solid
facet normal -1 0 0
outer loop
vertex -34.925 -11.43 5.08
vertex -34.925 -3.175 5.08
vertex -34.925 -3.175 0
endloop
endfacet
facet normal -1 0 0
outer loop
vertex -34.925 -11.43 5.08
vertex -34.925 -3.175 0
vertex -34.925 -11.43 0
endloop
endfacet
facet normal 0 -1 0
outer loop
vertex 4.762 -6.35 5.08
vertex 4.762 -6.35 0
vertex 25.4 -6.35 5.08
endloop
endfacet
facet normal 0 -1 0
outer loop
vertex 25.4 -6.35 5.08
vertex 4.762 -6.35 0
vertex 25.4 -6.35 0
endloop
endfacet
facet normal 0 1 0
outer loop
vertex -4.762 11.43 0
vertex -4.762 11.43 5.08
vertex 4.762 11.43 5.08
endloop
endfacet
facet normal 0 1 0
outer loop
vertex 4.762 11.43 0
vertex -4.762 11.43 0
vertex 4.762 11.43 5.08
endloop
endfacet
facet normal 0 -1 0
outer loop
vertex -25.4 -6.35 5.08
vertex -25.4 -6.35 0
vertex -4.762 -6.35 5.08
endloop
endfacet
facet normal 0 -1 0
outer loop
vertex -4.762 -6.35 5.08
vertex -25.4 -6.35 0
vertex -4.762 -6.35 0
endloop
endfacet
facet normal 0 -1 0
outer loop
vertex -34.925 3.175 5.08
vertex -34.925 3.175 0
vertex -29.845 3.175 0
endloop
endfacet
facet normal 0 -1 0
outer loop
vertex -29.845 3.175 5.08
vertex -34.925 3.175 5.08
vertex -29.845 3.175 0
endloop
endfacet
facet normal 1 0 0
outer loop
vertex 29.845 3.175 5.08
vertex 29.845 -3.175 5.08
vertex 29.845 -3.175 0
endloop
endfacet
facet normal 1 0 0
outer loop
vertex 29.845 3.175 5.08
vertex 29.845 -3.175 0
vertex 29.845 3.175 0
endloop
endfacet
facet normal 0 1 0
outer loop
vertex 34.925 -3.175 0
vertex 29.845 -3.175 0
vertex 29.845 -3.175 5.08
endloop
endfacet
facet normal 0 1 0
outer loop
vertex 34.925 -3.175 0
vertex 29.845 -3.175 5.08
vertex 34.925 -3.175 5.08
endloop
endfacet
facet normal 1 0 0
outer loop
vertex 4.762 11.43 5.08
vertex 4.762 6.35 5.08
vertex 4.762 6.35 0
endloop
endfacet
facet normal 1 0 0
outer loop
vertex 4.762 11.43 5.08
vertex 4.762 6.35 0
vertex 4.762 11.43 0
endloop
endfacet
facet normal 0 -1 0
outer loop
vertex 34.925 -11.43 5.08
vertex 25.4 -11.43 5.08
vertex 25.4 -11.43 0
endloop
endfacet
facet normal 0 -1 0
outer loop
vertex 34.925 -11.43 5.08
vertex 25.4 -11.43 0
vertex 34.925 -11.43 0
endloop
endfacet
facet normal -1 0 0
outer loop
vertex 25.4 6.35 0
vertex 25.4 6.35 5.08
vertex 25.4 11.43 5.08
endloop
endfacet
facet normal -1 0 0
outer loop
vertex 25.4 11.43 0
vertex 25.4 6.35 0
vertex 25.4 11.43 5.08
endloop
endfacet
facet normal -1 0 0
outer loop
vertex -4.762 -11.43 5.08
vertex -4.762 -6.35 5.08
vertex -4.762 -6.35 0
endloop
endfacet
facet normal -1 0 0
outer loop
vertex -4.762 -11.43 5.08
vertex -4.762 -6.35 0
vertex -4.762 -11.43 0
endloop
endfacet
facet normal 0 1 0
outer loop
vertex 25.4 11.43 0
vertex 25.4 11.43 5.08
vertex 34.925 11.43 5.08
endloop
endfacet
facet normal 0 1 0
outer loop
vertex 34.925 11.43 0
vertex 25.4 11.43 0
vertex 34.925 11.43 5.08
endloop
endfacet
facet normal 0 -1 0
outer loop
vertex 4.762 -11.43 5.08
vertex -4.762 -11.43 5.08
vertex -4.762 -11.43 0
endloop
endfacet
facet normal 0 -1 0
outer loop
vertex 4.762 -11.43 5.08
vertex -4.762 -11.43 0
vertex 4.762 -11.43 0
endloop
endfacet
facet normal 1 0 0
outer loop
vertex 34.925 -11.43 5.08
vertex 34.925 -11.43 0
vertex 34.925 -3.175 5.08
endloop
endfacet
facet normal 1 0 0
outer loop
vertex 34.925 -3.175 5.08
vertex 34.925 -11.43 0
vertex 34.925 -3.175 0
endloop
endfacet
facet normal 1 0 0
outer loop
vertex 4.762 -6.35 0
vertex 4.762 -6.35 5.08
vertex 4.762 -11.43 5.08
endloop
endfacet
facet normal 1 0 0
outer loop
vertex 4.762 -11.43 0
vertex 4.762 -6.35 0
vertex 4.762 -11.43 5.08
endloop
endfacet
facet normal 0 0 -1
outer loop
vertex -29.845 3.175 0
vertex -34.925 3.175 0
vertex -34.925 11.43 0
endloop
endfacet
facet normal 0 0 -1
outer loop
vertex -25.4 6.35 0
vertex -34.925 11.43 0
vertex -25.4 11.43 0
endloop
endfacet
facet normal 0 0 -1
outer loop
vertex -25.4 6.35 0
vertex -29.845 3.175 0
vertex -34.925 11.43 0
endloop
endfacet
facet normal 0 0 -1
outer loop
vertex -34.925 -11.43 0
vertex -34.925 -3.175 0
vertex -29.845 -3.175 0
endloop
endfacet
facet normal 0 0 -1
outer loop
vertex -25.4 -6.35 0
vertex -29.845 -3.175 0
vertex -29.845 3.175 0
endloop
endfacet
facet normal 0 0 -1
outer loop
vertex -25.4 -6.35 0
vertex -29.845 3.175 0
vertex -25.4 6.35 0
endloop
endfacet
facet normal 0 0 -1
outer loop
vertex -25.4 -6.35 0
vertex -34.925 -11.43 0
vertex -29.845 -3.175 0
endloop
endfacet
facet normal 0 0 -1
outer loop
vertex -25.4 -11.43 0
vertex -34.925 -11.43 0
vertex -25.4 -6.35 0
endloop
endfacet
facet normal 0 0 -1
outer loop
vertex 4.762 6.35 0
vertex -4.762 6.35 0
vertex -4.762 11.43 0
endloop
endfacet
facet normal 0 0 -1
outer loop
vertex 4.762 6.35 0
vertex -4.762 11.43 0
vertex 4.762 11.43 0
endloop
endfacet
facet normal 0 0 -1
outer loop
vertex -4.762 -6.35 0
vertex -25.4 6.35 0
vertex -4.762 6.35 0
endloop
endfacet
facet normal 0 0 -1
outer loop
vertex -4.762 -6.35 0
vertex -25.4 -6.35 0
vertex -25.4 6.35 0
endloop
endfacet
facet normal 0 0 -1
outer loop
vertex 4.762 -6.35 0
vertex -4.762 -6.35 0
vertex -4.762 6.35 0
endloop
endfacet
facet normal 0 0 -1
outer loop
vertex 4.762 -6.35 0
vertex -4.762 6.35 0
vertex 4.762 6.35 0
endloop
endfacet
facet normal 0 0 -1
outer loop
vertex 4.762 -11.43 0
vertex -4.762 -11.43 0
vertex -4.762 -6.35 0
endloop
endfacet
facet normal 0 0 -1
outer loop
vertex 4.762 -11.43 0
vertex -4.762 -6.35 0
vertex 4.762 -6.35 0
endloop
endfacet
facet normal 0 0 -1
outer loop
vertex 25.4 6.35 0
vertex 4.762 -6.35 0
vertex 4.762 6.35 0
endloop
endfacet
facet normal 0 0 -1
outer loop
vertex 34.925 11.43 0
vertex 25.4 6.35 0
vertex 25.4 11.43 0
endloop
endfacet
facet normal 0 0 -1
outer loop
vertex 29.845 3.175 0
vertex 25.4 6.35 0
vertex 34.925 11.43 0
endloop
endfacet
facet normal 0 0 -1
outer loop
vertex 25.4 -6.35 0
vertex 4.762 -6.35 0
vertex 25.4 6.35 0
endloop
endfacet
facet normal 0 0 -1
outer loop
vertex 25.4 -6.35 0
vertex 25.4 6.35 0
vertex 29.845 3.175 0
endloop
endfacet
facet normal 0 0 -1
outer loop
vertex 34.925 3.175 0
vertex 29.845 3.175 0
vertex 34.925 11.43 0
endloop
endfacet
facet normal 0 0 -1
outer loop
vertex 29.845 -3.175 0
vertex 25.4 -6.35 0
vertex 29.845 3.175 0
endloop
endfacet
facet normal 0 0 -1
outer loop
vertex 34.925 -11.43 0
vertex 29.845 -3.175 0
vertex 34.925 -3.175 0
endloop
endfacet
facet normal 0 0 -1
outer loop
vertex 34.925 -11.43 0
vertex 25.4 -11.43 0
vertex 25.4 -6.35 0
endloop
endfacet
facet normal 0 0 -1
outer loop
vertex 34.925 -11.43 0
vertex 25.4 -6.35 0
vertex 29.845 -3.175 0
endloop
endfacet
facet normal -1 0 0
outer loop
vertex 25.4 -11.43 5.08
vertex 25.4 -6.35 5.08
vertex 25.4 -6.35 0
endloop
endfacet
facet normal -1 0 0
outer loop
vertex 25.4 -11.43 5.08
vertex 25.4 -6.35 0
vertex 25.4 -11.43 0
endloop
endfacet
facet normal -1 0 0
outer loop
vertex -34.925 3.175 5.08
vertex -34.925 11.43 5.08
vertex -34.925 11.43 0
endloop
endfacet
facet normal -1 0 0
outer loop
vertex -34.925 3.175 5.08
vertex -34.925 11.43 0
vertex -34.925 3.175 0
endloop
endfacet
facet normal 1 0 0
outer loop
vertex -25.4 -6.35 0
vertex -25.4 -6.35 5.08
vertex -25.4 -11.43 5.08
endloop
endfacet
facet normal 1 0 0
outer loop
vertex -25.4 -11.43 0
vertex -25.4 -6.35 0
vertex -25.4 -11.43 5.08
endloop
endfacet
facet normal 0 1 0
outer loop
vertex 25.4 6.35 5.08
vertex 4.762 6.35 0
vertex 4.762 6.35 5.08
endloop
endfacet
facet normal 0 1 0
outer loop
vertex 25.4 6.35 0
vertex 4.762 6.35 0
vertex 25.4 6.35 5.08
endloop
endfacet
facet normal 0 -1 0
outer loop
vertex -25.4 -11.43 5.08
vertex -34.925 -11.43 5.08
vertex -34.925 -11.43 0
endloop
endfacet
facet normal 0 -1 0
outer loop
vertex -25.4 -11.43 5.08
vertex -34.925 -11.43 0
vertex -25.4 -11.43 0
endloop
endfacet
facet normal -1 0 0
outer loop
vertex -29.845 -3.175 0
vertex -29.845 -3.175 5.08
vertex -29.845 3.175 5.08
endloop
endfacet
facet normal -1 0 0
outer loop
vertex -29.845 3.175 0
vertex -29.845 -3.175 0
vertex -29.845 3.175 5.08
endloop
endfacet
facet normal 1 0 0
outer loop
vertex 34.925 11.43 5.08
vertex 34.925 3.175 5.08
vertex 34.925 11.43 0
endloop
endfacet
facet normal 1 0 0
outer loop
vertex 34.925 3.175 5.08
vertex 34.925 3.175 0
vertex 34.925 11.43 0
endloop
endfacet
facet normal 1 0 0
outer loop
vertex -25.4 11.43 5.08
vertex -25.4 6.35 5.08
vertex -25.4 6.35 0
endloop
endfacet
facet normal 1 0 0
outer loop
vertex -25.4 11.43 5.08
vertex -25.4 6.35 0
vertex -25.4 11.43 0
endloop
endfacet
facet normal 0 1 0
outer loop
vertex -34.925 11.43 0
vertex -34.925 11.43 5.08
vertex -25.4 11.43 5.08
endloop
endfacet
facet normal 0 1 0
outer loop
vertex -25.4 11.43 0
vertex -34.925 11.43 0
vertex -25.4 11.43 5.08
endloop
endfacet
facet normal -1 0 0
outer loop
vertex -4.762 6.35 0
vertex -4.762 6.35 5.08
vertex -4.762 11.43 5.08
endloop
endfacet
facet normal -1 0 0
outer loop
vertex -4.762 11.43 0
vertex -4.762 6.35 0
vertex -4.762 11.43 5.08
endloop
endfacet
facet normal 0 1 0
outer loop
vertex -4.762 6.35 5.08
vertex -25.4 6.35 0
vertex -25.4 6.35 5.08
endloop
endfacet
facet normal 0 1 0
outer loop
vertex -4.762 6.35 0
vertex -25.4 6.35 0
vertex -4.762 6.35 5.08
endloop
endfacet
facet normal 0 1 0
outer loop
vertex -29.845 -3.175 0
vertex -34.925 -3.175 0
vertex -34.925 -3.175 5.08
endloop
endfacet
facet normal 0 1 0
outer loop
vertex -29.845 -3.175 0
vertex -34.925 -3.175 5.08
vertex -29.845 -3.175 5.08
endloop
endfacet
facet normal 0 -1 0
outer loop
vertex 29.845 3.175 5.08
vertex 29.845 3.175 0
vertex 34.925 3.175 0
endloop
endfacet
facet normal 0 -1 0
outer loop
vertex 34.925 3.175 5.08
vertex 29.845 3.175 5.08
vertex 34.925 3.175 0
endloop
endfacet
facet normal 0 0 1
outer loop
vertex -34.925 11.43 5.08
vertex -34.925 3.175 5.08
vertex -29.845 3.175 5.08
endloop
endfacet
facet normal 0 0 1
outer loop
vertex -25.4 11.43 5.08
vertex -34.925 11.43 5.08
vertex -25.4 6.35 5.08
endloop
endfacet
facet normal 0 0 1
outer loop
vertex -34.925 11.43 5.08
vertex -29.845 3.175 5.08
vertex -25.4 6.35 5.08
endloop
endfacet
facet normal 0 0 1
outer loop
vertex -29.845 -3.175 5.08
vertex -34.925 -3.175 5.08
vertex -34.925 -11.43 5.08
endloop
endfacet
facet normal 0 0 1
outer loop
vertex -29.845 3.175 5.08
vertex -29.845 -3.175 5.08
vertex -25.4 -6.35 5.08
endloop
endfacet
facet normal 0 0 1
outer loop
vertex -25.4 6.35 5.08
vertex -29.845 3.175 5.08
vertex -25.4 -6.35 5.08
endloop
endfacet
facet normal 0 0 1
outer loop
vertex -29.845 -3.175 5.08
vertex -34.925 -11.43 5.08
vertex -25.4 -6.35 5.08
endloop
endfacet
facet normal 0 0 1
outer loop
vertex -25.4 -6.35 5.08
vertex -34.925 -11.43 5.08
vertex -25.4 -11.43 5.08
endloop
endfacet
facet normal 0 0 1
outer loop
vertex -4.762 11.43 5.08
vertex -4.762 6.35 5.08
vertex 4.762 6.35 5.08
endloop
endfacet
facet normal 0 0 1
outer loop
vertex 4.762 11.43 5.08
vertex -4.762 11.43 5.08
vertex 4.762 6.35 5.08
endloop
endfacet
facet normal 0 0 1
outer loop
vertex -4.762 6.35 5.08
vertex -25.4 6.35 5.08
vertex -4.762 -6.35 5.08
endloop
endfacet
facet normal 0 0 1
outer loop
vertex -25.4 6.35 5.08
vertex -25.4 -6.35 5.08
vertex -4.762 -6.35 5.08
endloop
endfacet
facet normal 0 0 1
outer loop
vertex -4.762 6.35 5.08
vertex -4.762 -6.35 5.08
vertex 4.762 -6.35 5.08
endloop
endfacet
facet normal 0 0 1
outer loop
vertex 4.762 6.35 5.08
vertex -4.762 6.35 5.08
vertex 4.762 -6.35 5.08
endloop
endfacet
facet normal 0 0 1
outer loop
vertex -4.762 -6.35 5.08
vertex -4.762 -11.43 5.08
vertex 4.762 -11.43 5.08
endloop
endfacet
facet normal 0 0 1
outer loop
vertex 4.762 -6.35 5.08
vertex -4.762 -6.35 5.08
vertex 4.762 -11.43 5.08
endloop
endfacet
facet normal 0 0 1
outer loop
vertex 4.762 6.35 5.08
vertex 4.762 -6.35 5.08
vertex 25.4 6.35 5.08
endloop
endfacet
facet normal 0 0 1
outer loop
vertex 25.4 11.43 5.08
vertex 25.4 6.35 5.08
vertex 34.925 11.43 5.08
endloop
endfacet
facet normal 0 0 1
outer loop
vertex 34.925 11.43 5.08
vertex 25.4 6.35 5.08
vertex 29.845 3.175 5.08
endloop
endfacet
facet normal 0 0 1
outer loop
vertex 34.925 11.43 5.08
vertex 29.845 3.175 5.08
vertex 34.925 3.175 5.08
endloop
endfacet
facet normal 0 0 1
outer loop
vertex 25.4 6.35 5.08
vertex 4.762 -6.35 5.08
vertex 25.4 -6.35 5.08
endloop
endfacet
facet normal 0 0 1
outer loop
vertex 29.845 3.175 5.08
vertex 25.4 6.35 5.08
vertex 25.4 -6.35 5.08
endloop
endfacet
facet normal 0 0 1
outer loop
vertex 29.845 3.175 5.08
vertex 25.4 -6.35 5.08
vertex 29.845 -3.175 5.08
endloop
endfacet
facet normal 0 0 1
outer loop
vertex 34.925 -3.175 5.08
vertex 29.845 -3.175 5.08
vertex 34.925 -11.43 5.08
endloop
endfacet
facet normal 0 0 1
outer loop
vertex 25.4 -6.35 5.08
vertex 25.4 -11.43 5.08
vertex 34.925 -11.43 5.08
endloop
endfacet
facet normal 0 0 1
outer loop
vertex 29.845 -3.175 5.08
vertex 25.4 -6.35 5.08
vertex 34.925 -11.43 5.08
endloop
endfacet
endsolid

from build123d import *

# Parameters (mm, degrees)
SKETCH1_W           = 69.85
SKETCH1_H           = 12.7
BOSS_EXTRUDE1_DEPTH = 5.08
SKETCH2_W           = 9.525
SKETCH2_H           = 5.08
BOSS_EXTRUDE2_DEPTH = 5.08
SKETCH3_W           = 5.08
SKETCH3_H           = 6.35
CUT_EXTRUDE1_DEPTH  = 5.08


with BuildPart() as part:
    # Sketch1 → Boss-Extrude1 (new body)
    with BuildSketch(Plane.XY):
        Rectangle(SKETCH1_W, SKETCH1_H)
    extrude(amount=BOSS_EXTRUDE1_DEPTH)

    # Sketch2 → Boss-Extrude2 (add)
    with BuildSketch(Plane.XY.offset(5.08)):
        with Locations((-30.1625, 8.89)):
            Rectangle(SKETCH2_W, SKETCH2_H)
        with Locations((30.1625, 8.89)):
            Rectangle(SKETCH2_W, SKETCH2_H)
        with Locations((0, 8.89)):
            Rectangle(SKETCH2_W, SKETCH2_H)
    boss_extrude2 = extrude(amount=-BOSS_EXTRUDE2_DEPTH)

    # Mirror1: Boss-Extrude2 across plane
    add(boss_extrude2.mirror(Plane.ZX))

    # Sketch3 → Cut-Extrude1 (cut)
    with BuildSketch(Plane.XY.offset(5.08)):
        with Locations((-32.385, 0)):
            Rectangle(SKETCH3_W, SKETCH3_H)
        with Locations((32.385, 0)):
            Rectangle(SKETCH3_W, SKETCH3_H)
    extrude(amount=-CUT_EXTRUDE1_DEPTH, mode=Mode.SUBTRACT)


solid = part.part
